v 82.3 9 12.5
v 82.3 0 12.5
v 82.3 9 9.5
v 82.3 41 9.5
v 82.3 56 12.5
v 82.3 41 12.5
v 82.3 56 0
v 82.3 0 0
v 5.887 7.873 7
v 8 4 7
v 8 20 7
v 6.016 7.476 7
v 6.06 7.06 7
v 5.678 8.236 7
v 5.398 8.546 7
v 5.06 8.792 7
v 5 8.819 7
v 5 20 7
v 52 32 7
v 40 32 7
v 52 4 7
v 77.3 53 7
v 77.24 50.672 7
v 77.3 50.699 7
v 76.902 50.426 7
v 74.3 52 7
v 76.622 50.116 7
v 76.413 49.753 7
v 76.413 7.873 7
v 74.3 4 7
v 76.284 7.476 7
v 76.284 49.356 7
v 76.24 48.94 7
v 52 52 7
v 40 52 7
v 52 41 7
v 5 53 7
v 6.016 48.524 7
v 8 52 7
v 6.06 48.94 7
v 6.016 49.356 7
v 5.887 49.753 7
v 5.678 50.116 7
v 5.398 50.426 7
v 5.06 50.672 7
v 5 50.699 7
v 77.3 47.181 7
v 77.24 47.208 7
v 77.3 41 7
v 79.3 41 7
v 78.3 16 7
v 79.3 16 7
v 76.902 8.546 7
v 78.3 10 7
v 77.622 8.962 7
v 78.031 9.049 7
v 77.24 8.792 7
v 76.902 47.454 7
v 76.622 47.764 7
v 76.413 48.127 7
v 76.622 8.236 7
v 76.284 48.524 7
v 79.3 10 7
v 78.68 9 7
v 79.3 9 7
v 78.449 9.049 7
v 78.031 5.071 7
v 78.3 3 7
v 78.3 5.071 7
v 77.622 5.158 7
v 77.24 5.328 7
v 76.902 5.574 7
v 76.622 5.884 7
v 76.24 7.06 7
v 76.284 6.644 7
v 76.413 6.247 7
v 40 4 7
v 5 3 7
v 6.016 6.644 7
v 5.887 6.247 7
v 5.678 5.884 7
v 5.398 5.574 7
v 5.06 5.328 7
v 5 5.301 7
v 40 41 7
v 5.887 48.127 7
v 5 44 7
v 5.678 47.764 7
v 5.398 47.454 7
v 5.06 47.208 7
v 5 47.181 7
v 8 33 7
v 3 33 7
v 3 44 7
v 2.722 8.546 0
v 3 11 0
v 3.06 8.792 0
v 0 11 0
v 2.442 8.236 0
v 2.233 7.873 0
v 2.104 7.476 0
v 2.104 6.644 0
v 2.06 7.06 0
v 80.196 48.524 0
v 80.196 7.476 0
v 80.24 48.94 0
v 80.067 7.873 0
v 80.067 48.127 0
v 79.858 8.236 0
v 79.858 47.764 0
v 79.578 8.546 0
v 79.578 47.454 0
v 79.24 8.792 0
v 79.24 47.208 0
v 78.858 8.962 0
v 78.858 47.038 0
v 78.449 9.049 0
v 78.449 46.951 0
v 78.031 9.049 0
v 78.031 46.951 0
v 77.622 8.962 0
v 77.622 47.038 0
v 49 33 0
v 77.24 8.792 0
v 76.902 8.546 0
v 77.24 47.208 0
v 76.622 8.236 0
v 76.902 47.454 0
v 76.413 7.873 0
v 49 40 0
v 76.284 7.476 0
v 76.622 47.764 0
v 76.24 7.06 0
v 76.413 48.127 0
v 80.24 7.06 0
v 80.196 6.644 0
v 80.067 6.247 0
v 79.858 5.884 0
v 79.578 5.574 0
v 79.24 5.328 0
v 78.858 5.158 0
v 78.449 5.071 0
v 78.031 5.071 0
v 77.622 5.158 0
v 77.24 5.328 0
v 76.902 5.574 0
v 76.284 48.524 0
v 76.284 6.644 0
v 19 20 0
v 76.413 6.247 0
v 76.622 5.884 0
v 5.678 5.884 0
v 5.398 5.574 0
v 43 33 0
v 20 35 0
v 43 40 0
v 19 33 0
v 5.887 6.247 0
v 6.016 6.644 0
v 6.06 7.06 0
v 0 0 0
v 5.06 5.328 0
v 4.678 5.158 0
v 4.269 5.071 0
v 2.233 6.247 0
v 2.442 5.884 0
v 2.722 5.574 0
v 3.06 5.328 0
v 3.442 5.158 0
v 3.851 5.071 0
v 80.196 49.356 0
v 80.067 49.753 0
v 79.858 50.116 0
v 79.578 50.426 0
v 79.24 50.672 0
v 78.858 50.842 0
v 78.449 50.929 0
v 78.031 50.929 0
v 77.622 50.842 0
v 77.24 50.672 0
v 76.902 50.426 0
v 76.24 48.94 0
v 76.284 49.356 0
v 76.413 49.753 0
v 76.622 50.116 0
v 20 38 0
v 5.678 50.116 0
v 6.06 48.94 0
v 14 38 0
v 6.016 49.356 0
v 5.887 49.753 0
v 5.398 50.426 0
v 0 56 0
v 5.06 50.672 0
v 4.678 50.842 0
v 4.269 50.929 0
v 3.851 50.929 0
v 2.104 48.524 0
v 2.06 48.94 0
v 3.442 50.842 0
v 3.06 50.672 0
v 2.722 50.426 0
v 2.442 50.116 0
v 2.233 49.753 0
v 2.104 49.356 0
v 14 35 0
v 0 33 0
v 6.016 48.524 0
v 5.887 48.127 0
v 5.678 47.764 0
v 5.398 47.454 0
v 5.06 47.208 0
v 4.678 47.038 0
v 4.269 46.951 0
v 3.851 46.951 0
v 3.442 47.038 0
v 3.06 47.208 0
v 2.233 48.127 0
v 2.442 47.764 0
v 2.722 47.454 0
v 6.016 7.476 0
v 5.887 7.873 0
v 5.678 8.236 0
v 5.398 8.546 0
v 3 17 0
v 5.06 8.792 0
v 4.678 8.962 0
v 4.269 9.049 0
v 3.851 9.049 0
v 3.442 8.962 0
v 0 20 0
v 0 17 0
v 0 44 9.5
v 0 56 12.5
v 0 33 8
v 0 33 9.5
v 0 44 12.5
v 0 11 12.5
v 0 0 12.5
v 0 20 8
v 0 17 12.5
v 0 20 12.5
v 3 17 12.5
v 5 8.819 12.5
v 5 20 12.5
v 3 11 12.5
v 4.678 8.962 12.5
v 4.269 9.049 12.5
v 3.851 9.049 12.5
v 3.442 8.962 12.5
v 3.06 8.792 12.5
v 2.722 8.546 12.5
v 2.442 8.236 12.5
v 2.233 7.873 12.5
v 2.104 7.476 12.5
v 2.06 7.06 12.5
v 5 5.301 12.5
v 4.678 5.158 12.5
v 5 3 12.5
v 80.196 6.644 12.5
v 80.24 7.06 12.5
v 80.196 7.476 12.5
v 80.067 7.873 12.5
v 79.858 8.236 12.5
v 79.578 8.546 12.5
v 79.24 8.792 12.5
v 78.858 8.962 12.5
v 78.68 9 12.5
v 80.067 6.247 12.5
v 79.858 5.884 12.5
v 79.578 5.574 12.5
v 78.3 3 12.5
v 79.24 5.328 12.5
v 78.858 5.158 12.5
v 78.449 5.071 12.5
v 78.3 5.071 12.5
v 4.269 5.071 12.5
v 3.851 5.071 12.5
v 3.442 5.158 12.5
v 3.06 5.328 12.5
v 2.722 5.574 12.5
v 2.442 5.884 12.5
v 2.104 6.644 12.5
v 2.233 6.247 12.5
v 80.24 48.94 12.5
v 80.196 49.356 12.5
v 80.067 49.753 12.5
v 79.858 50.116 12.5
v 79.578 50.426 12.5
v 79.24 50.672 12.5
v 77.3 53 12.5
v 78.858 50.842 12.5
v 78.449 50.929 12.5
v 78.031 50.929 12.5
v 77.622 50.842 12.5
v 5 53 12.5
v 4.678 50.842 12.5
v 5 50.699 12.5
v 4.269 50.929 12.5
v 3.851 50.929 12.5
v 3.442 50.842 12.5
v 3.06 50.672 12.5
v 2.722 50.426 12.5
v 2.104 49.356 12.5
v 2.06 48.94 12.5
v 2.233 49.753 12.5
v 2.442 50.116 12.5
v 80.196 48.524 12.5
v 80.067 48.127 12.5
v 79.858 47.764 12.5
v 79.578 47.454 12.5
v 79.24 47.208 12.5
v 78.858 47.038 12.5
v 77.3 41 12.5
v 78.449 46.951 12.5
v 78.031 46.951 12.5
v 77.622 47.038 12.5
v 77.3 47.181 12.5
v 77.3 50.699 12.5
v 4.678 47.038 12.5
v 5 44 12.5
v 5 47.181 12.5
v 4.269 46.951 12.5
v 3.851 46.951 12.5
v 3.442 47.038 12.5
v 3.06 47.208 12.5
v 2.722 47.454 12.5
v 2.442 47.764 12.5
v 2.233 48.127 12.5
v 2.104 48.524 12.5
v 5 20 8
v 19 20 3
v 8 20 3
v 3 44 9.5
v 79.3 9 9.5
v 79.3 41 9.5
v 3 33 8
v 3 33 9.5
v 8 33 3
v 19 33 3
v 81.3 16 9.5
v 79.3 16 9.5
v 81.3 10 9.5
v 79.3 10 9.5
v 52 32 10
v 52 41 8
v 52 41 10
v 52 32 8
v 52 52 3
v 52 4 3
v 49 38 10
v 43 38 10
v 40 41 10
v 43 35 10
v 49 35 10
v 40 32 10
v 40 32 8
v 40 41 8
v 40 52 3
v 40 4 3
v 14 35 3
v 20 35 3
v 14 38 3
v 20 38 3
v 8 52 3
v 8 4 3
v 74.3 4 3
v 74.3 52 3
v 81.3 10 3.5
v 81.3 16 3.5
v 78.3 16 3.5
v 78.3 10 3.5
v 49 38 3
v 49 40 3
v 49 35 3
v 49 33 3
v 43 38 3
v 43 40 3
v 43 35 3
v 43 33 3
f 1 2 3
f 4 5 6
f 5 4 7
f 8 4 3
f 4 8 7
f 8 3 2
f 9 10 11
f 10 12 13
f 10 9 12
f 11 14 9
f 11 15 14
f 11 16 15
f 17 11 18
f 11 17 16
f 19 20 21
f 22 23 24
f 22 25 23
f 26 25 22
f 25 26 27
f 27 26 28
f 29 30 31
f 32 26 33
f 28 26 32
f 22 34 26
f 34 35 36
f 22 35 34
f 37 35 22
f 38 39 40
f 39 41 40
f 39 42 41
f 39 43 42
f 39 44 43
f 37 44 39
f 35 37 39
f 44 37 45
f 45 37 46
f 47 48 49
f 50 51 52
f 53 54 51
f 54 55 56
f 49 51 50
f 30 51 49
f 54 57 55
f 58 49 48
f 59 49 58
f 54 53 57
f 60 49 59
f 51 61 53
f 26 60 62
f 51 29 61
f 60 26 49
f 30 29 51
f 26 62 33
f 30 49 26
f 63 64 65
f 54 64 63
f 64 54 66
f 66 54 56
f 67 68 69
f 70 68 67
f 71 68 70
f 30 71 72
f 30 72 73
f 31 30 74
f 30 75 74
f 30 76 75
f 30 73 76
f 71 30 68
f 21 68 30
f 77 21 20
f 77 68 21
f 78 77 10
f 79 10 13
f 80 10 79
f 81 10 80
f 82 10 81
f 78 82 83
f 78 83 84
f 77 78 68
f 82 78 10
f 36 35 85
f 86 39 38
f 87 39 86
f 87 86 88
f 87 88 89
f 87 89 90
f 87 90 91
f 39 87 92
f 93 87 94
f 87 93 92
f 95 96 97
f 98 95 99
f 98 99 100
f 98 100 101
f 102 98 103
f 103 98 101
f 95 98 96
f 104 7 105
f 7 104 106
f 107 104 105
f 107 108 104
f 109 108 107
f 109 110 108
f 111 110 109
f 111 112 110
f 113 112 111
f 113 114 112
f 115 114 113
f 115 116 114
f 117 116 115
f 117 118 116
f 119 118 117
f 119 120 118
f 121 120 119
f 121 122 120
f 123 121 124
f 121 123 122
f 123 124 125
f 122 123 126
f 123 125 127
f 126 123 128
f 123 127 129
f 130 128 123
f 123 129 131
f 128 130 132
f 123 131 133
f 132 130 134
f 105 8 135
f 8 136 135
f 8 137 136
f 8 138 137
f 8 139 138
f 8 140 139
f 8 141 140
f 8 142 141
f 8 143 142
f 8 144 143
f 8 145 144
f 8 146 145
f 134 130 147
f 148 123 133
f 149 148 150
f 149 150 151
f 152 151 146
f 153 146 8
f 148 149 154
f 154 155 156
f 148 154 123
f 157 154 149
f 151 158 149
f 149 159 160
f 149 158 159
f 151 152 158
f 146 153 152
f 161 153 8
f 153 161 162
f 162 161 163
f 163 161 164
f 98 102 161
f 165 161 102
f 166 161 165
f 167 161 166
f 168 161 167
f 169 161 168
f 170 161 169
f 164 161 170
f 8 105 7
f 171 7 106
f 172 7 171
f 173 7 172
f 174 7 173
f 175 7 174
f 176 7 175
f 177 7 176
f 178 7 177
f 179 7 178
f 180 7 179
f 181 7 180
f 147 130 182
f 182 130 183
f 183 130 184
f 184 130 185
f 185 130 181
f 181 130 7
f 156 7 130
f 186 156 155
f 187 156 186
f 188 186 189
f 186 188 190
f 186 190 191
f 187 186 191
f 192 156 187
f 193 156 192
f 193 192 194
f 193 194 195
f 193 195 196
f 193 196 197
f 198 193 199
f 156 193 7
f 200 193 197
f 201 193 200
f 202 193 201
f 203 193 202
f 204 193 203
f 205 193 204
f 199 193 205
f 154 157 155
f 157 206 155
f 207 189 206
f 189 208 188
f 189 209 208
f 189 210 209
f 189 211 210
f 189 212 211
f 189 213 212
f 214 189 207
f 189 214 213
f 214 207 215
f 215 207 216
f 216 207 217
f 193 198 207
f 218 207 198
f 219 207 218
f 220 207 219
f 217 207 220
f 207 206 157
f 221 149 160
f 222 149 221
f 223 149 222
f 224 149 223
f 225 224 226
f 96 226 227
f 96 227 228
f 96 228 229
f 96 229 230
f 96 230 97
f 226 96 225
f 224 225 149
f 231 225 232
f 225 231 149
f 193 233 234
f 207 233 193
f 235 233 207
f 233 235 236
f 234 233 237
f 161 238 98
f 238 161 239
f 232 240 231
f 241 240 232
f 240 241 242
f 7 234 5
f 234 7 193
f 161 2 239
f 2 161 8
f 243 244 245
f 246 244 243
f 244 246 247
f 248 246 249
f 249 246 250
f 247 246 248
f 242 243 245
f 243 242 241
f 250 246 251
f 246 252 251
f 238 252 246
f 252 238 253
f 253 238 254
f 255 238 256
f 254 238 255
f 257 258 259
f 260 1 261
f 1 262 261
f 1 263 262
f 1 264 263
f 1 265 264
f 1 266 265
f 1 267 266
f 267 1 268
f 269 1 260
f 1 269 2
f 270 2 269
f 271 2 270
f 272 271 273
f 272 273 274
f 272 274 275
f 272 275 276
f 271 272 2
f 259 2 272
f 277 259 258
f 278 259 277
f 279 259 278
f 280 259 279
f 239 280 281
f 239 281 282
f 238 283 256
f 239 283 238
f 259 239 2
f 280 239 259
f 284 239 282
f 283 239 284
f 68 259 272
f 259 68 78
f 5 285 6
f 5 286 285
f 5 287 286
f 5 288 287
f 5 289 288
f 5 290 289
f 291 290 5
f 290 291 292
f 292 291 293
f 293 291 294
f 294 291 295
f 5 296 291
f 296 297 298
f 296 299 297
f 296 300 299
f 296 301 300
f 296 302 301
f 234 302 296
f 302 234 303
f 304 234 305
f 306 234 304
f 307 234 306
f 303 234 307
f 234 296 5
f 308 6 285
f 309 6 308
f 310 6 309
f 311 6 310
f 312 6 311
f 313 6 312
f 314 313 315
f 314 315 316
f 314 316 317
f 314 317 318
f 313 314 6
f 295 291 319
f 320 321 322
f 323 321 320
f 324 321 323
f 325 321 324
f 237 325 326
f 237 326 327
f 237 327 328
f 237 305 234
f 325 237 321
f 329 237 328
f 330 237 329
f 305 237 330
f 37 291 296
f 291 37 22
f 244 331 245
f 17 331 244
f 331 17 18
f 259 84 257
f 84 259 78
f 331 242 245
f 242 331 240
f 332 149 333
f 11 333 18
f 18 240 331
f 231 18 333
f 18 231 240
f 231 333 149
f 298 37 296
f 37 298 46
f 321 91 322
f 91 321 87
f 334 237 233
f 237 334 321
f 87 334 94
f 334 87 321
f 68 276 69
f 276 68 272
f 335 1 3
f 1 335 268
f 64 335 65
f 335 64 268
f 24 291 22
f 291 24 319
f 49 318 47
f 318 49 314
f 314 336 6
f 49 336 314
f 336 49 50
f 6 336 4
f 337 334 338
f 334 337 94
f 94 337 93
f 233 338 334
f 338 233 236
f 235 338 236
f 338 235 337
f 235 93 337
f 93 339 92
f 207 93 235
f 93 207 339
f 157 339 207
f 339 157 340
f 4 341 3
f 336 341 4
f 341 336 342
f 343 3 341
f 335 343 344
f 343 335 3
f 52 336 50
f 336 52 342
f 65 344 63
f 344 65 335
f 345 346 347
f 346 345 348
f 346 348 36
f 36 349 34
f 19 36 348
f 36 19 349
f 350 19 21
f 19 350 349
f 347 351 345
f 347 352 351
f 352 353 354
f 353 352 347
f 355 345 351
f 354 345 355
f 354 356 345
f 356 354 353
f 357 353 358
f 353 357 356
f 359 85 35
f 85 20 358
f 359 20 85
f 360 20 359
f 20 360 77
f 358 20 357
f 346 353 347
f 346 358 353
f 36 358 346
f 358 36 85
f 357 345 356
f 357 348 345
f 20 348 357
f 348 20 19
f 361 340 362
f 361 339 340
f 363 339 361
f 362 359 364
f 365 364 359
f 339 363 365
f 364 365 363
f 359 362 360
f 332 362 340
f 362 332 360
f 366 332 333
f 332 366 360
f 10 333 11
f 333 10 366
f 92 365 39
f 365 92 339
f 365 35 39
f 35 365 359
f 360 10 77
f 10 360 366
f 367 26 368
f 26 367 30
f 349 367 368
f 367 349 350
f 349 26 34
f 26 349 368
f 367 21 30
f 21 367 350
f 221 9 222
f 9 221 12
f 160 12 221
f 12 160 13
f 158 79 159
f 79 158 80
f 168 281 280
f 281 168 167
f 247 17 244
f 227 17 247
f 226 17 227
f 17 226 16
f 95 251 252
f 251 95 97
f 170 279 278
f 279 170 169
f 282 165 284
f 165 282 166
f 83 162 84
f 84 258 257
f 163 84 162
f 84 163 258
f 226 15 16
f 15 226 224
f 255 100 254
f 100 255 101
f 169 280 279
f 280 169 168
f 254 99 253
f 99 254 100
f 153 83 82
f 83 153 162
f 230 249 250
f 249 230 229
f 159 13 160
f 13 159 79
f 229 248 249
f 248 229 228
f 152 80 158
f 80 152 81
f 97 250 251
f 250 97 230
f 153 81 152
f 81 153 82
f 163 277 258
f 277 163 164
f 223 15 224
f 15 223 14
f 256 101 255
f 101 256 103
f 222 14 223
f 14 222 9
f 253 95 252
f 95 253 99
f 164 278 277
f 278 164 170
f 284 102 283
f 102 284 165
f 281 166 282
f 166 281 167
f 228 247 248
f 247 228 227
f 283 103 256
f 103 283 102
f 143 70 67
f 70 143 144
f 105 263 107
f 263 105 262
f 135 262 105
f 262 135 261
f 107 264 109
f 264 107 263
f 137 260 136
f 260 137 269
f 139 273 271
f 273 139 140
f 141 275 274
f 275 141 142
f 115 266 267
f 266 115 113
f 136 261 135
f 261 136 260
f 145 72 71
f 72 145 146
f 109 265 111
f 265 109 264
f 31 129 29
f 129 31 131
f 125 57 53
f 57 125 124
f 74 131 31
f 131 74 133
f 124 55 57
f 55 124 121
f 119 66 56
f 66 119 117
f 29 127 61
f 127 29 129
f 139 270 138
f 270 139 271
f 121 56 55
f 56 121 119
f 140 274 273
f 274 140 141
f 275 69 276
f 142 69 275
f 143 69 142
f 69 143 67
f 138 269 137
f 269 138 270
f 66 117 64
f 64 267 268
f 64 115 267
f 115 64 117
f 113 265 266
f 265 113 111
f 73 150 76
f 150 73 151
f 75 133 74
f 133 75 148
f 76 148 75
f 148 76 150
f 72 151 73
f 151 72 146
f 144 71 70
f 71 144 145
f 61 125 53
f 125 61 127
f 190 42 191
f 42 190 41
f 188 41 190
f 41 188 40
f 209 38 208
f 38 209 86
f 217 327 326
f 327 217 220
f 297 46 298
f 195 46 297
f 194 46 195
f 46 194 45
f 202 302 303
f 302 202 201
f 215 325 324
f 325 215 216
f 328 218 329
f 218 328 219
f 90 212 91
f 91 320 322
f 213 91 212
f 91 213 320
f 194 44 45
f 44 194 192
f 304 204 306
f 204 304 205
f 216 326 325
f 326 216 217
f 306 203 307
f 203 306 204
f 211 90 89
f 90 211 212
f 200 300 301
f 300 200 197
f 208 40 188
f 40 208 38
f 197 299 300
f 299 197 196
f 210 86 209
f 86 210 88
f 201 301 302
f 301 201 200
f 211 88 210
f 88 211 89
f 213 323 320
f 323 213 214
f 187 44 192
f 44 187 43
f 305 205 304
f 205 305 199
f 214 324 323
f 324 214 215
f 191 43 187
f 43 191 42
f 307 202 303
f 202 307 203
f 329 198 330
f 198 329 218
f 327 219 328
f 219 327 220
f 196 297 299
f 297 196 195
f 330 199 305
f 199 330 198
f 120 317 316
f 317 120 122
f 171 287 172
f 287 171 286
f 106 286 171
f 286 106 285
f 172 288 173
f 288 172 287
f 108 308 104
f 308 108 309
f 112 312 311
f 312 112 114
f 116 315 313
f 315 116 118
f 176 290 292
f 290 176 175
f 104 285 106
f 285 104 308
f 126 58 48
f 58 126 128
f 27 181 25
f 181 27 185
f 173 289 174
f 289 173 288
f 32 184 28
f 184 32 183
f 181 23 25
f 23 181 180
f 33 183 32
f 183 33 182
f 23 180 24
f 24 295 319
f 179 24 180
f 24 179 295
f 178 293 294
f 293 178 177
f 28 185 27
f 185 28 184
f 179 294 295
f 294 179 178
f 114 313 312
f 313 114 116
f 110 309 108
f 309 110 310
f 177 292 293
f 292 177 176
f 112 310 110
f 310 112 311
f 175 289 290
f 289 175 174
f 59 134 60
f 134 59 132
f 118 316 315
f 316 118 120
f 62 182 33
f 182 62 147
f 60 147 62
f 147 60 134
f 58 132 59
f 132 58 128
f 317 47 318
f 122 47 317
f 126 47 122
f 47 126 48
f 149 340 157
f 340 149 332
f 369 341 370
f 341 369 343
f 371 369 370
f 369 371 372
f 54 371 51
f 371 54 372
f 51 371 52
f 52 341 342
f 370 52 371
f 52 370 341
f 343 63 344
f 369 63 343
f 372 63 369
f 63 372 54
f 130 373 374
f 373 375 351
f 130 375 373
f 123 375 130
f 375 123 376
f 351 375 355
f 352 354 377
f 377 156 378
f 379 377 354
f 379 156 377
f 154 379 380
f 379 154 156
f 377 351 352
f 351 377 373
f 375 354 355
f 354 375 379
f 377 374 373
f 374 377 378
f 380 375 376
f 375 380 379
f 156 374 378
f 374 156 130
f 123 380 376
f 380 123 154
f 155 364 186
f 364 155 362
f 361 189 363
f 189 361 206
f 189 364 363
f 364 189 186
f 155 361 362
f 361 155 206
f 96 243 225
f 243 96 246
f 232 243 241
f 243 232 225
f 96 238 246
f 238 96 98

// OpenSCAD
// file: Common.scad
// Author   KMS - Martin Dubois, ing.
// Product  FX3-KB
// File     Hardware/Common.scad

// Constants
/////////////////////////////////////////////////////////////////////////////

SizeX_mm = 82.3;
SizeY_mm = 56  ;

// Modules
/////////////////////////////////////////////////////////////////////////////

module LessPlastic()
{
    translate( [                   8, 4, 3 ] ) cube( [ 32  , SizeY_mm - 2 * 4, 5 ] );
    translate( [ SizeX_mm - 22.3 - 8, 4, 3 ] ) cube( [ 22.3, SizeY_mm - 2 * 4, 5 ] );
}

module MountHoles()
{
    union()
    {
        translate( [            4.06,            7.06, -1 ] ) cylinder( r = 2, h = 20, $fs = 0.1 );
        translate( [ SizeX_mm - 4.06,            7.06, -1 ] ) cylinder( r = 2, h = 20, $fs = 0.1 );
        translate( [            4.06, SizeY_mm - 7.06, -1 ] ) cylinder( r = 2, h = 20, $fs = 0.1 );
        translate( [ SizeX_mm - 4.06, SizeY_mm - 7.06, -1 ] ) cylinder( r = 2, h = 20, $fs = 0.1 );
    }
}

module Plate( aZ )
{
    cube( [ SizeX_mm, SizeY_mm, aZ ] );
}
// main file
// Author   KMS - Martin Dubois, ing.
// Product  FX3-KB
// File     Hardware/Base.scad

include <Common.scad>

PlateZ_mm =  7  ;
SizeZ_mm  = 12.5;

difference()
{
  union()
  {
    Plate( PlateZ_mm );

    translate( [ 0,             0, PlateZ_mm ] )
      cube( [ SizeX_mm, 3, SizeZ_mm - PlateZ_mm ] );
    translate( [ 0, SizeY_mm -  3, PlateZ_mm ] )
      cube( [ SizeX_mm, 3, SizeZ_mm - PlateZ_mm ] );

    translate( [            0,                 3, PlateZ_mm ] )
      cube( [        5,  17, SizeZ_mm - PlateZ_mm ] );
    translate( [            0, SizeY_mm -  9 - 3, PlateZ_mm ] )
      cube( [        5,  9, SizeZ_mm - PlateZ_mm ] );
    translate( [ SizeX_mm - 4,                 3, PlateZ_mm ] )
      cube( [        4,  6, SizeZ_mm - PlateZ_mm ] );
    translate( [ SizeX_mm - 5, SizeY_mm - 12 - 3, PlateZ_mm ] )
      cube( [        5, 12, SizeZ_mm - PlateZ_mm ] );

    translate( [ 0, SizeY_mm - 11 - 9 - 3, PlateZ_mm ] )
      cube( [ 3, 11, SizeZ_mm - PlateZ_mm - 3 ] );

    translate( [ SizeX_mm - 3, SizeY_mm - 32 - 12 - 3, PlateZ_mm ] )
      cube( [ 3, 32, SizeZ_mm - PlateZ_mm - 3 ] );

    translate( [ 40, 32, PlateZ_mm ] )
      cube( [ 12, 9, SizeZ_mm - PlateZ_mm - 2.5 ] );
  }

	 union()
  {
    LessPlastic();
    MountHoles();

    // USB 3.0 connector
    translate( [ -1, 20, -1 ] )
      cube( [ 20, 13, PlateZ_mm + 2 ] );

    // SRAM_ENABLE jumber j5
    translate( [ SizeX_mm - 1 - 3, 10, 3.5 ] )
      cube( [ 3, 6, SizeZ_mm ] );

    // PMODE jumber j4
    translate( [ 43, 35, -1 ] )
      cube( [  6,  3, SizeZ_mm ] );

    translate( [ 43, 33, -1 ] )
      cube( [  6,  7, 4 ] );

    // VBUS jumper j2
    translate( [ 14, 35, -1 ] )
      cube( [  6,  3, SizeZ_mm ] );

    // Jumber j1
    translate( [ -1, 11, -1 ] )
      cube( [ 4, 6, SizeZ_mm + 2 ] );
  }
}
